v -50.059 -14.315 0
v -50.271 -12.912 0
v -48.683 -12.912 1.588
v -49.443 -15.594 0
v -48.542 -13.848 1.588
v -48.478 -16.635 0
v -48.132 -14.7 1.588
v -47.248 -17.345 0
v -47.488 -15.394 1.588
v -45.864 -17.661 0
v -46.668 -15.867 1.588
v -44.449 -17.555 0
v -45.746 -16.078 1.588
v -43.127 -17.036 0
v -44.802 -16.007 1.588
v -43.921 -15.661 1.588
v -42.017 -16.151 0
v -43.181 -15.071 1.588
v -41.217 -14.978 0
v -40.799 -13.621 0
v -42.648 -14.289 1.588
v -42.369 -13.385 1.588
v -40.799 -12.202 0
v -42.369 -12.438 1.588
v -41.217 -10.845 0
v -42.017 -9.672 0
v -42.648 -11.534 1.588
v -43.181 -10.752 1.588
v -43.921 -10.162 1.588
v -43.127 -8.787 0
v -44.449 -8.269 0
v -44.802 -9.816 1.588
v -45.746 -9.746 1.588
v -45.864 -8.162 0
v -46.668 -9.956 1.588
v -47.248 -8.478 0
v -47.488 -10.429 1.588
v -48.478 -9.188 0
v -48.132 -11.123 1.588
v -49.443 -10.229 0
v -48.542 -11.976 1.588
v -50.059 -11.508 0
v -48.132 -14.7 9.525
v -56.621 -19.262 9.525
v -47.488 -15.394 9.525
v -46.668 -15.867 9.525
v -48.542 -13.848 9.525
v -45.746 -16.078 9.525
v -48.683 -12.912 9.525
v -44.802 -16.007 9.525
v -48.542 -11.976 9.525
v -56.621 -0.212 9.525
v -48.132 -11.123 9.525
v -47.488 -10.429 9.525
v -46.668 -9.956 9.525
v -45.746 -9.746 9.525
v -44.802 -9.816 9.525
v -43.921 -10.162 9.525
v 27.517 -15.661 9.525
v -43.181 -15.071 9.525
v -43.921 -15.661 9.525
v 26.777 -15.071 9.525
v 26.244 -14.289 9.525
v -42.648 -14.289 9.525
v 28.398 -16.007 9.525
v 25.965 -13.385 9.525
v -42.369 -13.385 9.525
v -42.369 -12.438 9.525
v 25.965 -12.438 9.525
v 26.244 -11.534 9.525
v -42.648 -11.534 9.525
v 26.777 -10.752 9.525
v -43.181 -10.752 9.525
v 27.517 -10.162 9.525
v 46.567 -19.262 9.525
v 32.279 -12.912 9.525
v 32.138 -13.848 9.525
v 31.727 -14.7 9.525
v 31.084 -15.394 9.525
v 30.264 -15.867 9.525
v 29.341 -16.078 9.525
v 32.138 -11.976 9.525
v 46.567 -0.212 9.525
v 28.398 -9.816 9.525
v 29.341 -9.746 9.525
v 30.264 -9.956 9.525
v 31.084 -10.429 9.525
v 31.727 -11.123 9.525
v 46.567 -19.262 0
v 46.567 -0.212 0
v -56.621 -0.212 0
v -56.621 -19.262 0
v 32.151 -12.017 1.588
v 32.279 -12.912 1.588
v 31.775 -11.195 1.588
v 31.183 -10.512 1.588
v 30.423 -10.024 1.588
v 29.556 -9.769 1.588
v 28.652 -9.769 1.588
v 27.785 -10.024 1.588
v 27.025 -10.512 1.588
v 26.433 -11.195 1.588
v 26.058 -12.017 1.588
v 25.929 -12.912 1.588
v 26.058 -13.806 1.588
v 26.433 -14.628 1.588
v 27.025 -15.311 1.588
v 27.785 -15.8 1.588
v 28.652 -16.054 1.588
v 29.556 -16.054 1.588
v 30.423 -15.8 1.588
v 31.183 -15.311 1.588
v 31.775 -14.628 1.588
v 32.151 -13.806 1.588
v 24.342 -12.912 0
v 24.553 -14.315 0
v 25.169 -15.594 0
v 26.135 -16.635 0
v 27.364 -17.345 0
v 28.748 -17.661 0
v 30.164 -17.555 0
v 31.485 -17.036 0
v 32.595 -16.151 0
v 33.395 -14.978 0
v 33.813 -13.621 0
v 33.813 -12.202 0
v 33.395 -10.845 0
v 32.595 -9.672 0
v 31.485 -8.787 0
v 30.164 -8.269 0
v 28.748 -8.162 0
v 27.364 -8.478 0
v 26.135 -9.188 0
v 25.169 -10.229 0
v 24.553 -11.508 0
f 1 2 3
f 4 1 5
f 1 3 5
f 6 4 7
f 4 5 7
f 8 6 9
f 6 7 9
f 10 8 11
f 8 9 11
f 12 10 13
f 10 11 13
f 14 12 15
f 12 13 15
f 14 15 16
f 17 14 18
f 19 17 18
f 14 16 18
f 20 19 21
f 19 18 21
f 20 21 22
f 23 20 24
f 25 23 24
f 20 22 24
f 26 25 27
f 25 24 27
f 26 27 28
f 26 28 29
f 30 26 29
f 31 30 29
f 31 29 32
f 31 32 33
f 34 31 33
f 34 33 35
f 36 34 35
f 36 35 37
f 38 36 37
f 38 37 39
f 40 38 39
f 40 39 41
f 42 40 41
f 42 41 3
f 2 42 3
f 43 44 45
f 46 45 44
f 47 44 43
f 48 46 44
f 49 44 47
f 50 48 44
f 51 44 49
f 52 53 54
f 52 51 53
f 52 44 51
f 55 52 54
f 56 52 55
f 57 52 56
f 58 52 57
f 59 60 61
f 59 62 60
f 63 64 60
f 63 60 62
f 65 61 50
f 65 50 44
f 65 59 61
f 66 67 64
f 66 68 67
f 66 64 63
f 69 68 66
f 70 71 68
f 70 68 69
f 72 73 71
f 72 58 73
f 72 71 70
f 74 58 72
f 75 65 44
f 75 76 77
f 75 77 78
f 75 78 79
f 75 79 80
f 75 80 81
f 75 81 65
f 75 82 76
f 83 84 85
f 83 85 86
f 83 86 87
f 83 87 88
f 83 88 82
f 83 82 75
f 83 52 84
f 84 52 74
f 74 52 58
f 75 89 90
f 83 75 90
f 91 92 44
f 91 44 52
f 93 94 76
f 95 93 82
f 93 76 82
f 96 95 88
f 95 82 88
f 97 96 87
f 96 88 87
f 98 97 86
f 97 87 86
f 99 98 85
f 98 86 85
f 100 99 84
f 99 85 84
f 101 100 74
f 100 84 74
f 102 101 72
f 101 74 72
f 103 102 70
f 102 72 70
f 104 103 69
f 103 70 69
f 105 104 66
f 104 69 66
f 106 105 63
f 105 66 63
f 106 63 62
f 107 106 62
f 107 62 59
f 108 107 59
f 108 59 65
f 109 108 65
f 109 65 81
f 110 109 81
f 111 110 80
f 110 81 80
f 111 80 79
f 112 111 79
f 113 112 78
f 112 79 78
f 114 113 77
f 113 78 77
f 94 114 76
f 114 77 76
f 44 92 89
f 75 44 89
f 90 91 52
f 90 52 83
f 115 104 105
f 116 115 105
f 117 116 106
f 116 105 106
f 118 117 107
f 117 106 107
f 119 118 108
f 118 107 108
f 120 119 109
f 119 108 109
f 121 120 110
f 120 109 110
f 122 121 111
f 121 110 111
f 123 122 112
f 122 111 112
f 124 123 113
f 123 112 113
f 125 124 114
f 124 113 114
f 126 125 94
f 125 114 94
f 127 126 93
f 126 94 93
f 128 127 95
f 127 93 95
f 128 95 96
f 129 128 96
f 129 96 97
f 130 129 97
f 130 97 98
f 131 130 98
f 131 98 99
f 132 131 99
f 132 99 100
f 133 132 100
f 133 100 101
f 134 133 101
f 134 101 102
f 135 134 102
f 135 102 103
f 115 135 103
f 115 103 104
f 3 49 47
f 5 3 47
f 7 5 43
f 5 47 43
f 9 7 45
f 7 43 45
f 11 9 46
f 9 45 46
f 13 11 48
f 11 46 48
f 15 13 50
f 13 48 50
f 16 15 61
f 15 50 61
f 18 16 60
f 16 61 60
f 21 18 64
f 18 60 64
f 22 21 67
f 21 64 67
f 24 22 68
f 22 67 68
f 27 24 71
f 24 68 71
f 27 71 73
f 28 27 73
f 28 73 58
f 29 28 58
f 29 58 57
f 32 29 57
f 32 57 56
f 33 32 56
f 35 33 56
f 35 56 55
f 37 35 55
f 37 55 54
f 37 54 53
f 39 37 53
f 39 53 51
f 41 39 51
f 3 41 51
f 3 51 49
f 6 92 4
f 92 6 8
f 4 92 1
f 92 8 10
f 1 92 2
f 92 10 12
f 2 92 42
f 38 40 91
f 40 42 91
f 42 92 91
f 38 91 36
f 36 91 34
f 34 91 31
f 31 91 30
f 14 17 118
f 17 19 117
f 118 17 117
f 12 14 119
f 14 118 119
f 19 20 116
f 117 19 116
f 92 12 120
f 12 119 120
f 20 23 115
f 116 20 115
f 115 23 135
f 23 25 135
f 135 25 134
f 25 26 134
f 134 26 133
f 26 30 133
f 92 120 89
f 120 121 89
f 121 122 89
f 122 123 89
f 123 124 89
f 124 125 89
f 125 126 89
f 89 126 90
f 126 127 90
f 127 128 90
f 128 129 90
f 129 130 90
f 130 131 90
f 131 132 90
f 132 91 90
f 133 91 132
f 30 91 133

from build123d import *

# Parameters (mm, degrees)
F0_W           = 103.1875
F0_H           = 19.05
F1_DEPTH       = 9.525
F2_R           = 3.175
F3_DEPTH       = 9.525
F5_D           = 6.35
F5_CSINK_D     = 9.525
F5_CSINK_ANGLE = 90


with BuildPart() as f1:
    # F0 (on Top) → F1 (new body)
    with BuildSketch(Plane.XY):
        with Locations((-5.027081, -9.736668)):
            Rectangle(F0_W, F0_H)
    extrude(amount=F1_DEPTH)

    # F2 (on face) → F3 (cut)
    with BuildSketch(Plane.XY.offset(9.525)):
        with BuildLine():
            ThreePointArc((-42.333331, -12.911668), (-45.508331, -9.736668), (-48.683331, -12.911668))
            ThreePointArc((-48.683331, -12.911668), (-45.508331, -16.086668), (-42.333331, -12.911668))
        make_face()
        with Locations((29.104169, -12.911668)):
            Circle(F2_R)
    extrude(amount=-F3_DEPTH, mode=Mode.SUBTRACT)

    # F5 (through all)
    with Locations(Plane(origin=(0, 0, 0), x_dir=(1, 0, 0), z_dir=(0, 0, -1))):
        with Locations((-45.508331, 12.911668), (29.104169, 12.911668)):
            CounterSinkHole(F5_D / 2, F5_CSINK_D / 2, counter_sink_angle=F5_CSINK_ANGLE)


solid = f1.part
